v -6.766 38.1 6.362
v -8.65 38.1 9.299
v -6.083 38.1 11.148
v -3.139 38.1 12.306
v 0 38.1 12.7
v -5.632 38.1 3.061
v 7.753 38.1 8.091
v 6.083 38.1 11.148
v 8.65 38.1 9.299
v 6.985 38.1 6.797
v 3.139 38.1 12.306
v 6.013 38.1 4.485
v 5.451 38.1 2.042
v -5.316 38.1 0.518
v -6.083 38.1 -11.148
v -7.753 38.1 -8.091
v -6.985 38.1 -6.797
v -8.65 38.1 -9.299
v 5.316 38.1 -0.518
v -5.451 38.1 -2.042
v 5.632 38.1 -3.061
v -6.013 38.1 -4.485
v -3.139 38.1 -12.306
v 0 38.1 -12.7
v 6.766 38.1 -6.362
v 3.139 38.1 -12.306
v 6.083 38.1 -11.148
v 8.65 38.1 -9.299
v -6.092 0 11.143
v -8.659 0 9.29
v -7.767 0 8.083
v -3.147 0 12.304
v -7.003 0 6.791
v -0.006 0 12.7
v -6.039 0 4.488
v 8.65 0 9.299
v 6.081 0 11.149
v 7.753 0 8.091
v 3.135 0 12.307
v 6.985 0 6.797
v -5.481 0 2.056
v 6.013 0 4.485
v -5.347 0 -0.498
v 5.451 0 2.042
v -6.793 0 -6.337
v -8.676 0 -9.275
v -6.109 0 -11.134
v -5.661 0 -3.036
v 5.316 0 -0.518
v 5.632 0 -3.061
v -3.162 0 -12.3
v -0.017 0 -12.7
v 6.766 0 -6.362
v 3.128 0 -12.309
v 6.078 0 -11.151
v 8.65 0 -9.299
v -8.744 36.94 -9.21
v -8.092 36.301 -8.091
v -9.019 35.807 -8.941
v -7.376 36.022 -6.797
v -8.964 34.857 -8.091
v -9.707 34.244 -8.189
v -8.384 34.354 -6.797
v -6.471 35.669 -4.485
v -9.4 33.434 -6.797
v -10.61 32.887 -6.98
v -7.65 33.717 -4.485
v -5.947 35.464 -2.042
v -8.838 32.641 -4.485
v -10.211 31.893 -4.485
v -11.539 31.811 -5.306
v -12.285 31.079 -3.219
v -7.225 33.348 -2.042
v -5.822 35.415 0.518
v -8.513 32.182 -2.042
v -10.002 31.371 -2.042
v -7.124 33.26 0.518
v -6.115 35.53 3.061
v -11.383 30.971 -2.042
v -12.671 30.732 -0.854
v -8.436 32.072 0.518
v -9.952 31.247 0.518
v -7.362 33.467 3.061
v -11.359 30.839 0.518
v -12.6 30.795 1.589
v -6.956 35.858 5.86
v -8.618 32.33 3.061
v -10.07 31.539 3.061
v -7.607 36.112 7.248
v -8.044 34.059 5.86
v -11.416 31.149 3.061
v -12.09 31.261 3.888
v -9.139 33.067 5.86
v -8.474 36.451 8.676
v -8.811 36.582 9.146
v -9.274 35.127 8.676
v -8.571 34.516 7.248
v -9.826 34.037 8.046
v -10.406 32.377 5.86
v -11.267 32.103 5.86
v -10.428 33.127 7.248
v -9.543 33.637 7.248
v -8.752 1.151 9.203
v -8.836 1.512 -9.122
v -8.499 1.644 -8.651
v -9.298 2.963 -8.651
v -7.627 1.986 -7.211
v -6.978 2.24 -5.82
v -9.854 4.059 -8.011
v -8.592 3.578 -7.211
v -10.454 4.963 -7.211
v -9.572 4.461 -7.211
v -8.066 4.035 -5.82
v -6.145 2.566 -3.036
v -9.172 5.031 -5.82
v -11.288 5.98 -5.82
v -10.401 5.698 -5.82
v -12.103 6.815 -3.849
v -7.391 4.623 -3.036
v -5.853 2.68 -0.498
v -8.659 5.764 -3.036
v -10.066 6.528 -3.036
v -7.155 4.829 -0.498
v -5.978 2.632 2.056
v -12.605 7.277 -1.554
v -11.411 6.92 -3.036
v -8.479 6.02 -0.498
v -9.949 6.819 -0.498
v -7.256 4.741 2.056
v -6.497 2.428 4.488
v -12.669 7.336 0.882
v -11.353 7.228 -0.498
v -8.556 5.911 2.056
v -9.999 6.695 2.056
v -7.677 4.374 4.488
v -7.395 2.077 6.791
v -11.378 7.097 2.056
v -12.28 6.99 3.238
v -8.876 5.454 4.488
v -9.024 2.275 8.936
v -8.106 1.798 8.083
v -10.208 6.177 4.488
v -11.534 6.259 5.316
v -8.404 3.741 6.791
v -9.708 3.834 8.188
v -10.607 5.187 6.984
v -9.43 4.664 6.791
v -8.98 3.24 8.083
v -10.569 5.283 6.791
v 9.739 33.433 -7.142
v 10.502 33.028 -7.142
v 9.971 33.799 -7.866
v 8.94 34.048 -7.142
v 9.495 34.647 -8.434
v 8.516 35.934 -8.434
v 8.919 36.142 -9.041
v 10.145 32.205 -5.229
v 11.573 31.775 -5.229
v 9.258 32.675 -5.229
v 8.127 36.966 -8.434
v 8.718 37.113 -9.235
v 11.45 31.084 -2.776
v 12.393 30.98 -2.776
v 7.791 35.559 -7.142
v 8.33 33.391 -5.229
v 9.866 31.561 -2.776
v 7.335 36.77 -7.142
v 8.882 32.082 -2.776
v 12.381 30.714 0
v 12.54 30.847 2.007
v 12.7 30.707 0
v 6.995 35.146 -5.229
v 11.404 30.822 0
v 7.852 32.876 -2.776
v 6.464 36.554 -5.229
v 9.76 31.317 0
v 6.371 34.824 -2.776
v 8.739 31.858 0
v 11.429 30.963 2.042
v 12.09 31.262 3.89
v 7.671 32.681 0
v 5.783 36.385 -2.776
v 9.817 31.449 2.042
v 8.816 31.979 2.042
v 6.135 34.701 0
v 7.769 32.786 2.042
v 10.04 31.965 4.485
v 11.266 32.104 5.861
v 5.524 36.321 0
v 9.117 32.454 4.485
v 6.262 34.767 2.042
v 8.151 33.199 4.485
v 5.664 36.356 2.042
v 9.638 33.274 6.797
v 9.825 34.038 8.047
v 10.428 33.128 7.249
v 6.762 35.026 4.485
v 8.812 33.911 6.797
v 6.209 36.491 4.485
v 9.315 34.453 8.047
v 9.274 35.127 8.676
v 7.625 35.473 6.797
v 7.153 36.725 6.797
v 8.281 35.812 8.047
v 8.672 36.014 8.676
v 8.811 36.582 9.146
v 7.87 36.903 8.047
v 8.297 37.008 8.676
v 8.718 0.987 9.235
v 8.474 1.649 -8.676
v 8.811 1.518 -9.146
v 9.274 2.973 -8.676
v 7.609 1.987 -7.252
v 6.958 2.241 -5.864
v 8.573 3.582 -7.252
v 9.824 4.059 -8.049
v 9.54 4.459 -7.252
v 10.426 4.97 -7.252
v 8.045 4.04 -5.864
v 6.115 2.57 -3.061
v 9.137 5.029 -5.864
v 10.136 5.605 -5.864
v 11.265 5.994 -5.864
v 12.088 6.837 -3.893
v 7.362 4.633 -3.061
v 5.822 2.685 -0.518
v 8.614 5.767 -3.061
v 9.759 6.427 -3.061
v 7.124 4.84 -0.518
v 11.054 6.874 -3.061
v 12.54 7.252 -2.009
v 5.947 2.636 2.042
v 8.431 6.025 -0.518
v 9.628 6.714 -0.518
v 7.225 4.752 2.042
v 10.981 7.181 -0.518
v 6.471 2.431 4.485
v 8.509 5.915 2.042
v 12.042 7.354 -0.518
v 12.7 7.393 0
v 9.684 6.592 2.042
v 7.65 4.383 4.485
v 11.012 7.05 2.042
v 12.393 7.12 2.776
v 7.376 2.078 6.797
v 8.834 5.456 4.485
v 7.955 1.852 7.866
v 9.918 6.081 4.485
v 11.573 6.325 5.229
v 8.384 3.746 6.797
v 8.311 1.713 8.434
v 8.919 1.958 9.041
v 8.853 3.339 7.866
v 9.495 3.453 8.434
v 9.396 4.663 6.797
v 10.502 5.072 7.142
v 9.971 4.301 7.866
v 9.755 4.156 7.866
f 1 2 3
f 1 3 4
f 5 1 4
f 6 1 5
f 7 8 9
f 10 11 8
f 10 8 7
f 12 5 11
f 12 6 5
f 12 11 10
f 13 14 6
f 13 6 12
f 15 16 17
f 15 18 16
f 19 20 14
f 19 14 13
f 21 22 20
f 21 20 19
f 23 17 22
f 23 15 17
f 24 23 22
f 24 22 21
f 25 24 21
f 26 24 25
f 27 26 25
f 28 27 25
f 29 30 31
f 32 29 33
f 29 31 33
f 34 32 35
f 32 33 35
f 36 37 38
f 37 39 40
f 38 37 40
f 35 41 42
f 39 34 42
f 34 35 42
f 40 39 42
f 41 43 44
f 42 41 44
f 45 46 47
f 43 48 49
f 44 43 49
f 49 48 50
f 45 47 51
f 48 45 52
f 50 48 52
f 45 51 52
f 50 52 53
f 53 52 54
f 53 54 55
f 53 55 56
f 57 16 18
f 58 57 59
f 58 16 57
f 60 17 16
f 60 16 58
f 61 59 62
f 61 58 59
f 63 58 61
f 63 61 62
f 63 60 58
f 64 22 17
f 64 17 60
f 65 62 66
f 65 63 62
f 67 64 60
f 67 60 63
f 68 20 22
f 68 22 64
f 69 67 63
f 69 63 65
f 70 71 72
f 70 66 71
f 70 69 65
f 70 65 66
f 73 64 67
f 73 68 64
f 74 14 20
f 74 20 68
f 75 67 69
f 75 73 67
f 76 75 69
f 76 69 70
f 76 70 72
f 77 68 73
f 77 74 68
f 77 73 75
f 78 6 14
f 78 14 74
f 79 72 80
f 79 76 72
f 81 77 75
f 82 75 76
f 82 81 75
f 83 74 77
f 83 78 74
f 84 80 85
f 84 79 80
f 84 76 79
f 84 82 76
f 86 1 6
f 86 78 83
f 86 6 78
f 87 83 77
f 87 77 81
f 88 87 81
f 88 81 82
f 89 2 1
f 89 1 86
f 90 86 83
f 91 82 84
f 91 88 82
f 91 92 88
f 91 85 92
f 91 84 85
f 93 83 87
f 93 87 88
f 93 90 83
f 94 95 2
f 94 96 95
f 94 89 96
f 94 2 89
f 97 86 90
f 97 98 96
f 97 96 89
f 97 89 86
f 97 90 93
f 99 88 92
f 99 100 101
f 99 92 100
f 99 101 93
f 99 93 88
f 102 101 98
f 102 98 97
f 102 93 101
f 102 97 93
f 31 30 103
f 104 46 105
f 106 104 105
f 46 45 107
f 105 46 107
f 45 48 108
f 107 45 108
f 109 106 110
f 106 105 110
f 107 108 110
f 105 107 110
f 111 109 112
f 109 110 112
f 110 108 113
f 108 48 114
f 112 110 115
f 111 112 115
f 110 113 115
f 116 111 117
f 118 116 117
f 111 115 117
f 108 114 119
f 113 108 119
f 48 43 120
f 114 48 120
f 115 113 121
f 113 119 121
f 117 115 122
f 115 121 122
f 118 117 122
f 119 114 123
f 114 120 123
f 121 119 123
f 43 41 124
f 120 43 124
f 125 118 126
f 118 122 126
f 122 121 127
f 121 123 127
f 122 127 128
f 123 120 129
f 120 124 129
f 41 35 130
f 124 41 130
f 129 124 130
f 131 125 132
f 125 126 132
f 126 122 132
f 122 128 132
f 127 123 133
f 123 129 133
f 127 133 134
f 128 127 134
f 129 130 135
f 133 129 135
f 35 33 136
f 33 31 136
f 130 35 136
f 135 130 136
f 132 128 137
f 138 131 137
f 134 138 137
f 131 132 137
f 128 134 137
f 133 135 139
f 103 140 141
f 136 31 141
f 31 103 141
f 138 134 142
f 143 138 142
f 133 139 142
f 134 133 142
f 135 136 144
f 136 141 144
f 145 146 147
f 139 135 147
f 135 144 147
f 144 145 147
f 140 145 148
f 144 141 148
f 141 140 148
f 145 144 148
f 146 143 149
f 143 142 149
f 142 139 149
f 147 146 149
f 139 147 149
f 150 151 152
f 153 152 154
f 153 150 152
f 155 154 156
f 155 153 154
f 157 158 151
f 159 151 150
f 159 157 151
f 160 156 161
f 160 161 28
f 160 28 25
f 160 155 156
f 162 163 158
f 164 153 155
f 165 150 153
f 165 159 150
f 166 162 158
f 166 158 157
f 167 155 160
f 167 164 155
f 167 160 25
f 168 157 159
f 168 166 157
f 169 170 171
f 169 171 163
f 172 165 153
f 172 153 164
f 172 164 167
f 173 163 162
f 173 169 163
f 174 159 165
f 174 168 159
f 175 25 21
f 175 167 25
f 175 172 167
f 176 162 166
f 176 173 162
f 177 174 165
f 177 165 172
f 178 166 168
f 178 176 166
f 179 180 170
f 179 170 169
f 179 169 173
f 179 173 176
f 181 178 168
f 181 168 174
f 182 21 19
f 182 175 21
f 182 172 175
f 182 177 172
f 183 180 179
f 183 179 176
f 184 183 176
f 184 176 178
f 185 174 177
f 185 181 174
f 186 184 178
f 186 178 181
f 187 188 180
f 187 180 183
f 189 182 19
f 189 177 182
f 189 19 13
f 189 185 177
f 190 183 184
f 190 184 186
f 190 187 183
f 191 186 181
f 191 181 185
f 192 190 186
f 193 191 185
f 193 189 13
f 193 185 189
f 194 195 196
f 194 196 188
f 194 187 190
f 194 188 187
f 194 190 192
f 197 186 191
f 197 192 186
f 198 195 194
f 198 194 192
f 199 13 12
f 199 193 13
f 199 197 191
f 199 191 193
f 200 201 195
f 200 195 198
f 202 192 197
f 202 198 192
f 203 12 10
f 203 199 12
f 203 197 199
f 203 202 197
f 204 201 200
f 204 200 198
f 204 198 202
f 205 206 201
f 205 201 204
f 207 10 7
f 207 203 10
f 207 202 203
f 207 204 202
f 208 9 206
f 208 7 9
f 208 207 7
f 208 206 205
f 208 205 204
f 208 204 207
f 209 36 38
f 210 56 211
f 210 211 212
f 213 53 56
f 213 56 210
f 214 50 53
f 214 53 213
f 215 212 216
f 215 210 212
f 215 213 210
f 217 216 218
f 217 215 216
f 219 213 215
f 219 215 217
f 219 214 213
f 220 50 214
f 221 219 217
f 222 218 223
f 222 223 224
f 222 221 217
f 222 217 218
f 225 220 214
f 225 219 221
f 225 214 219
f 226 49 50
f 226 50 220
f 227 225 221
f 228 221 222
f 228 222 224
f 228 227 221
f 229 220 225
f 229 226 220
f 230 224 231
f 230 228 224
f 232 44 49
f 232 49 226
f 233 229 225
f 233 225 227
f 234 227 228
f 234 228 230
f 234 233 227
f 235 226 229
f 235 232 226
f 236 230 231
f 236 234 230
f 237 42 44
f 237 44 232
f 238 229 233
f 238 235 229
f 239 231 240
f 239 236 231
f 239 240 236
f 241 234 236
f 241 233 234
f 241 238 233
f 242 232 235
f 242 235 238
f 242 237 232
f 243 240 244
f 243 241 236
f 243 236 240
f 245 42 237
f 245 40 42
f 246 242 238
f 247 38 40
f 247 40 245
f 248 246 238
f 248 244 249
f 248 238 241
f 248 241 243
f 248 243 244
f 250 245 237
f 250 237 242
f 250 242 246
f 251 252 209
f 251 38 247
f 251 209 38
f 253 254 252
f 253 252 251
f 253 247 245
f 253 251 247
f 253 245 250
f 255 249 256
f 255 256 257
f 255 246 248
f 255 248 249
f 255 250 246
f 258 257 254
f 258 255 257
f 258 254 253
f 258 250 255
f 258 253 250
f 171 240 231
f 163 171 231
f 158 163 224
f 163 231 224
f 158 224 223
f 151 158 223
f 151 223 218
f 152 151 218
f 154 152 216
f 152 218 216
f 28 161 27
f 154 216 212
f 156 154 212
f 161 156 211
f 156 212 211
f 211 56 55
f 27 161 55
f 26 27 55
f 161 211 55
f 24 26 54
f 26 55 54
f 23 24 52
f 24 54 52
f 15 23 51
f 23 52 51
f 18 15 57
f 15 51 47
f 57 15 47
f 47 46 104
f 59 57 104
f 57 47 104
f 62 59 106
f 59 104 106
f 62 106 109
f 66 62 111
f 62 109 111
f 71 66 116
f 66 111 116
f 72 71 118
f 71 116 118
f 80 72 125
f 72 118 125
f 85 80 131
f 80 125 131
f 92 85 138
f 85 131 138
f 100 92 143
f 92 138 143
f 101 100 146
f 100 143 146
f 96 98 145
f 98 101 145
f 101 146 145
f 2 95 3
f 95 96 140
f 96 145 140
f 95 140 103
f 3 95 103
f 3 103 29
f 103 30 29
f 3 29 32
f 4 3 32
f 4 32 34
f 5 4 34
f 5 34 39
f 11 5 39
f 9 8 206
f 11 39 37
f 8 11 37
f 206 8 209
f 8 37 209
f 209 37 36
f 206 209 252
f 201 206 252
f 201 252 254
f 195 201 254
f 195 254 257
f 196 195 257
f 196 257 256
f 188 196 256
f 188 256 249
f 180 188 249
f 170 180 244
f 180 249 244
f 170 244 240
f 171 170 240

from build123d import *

# Parameters (mm, degrees)
SKETCH1_R           = 12.7
BOSS_EXTRUDE1_DEPTH = 38.1


with BuildPart() as part:
    # Sketch1 → Boss-Extrude1 (new body)
    with BuildSketch(Plane(origin=(0, 0, 0), x_dir=(1, 0, 0), z_dir=(0, 1, 0))):
        Circle(SKETCH1_R)
    extrude(amount=BOSS_EXTRUDE1_DEPTH)

    # Sketch2 → Cut-Revolve1 (revolve, cut)
    with BuildSketch(Plane(origin=(12.7, 0, 0), x_dir=(0, 0, -1), z_dir=(1, 0, 0))):
        with BuildLine():
            Line((-12.7, 38.1), (12.7, 38.1))
            ThreePointArc((12.7, 38.1), (0, 30.707213599), (-12.7, 38.1))
        make_face()
    revolve(axis=Axis((12.7, 38.1, 12.7), (0, 0, -1)), mode=Mode.SUBTRACT)

    # Sketch3 → Cut-Revolve2 (revolve, cut)
    with BuildSketch(Plane(origin=(12.7, 0, 0), x_dir=(0, 0, -1), z_dir=(1, 0, 0))):
        with BuildLine():
            Line((-12.7, 0), (12.7, 0))
            ThreePointArc((12.7, 0), (0, 7.392786401), (-12.7, 0))
        make_face()
    revolve(axis=Axis((12.7, 0, 12.7), (0, 0, -1)), mode=Mode.SUBTRACT)

    # Sketch4 → Cut-Revolve3 (revolve, cut)
    with BuildSketch(Plane(origin=(-12.7, 0, 0), x_dir=(0, 0, -1), z_dir=(1, 0, 0))):
        with BuildLine():
            Line((-12.7, 38.1), (12.7, 38.1))
            ThreePointArc((12.7, 38.1), (0, 30.707213599), (-12.7, 38.1))
        make_face()
    revolve(axis=Axis((-12.7, 38.1, 12.7), (0, 0, -1)), mode=Mode.SUBTRACT)

    # Sketch5 → Cut-Revolve4 (revolve, cut)
    with BuildSketch(Plane(origin=(-12.7, 0, 0), x_dir=(0, 0, -1), z_dir=(1, 0, 0))):
        with BuildLine():
            Line((-12.7, 0), (12.664915911, 0))
            ThreePointArc((12.664915911, 0), (-0.017542044, 7.361983694), (-12.7, 0))
        make_face()
    revolve(axis=Axis((-12.7, 0, 0), (0, 0, 1)), mode=Mode.SUBTRACT)


solid = part.part
